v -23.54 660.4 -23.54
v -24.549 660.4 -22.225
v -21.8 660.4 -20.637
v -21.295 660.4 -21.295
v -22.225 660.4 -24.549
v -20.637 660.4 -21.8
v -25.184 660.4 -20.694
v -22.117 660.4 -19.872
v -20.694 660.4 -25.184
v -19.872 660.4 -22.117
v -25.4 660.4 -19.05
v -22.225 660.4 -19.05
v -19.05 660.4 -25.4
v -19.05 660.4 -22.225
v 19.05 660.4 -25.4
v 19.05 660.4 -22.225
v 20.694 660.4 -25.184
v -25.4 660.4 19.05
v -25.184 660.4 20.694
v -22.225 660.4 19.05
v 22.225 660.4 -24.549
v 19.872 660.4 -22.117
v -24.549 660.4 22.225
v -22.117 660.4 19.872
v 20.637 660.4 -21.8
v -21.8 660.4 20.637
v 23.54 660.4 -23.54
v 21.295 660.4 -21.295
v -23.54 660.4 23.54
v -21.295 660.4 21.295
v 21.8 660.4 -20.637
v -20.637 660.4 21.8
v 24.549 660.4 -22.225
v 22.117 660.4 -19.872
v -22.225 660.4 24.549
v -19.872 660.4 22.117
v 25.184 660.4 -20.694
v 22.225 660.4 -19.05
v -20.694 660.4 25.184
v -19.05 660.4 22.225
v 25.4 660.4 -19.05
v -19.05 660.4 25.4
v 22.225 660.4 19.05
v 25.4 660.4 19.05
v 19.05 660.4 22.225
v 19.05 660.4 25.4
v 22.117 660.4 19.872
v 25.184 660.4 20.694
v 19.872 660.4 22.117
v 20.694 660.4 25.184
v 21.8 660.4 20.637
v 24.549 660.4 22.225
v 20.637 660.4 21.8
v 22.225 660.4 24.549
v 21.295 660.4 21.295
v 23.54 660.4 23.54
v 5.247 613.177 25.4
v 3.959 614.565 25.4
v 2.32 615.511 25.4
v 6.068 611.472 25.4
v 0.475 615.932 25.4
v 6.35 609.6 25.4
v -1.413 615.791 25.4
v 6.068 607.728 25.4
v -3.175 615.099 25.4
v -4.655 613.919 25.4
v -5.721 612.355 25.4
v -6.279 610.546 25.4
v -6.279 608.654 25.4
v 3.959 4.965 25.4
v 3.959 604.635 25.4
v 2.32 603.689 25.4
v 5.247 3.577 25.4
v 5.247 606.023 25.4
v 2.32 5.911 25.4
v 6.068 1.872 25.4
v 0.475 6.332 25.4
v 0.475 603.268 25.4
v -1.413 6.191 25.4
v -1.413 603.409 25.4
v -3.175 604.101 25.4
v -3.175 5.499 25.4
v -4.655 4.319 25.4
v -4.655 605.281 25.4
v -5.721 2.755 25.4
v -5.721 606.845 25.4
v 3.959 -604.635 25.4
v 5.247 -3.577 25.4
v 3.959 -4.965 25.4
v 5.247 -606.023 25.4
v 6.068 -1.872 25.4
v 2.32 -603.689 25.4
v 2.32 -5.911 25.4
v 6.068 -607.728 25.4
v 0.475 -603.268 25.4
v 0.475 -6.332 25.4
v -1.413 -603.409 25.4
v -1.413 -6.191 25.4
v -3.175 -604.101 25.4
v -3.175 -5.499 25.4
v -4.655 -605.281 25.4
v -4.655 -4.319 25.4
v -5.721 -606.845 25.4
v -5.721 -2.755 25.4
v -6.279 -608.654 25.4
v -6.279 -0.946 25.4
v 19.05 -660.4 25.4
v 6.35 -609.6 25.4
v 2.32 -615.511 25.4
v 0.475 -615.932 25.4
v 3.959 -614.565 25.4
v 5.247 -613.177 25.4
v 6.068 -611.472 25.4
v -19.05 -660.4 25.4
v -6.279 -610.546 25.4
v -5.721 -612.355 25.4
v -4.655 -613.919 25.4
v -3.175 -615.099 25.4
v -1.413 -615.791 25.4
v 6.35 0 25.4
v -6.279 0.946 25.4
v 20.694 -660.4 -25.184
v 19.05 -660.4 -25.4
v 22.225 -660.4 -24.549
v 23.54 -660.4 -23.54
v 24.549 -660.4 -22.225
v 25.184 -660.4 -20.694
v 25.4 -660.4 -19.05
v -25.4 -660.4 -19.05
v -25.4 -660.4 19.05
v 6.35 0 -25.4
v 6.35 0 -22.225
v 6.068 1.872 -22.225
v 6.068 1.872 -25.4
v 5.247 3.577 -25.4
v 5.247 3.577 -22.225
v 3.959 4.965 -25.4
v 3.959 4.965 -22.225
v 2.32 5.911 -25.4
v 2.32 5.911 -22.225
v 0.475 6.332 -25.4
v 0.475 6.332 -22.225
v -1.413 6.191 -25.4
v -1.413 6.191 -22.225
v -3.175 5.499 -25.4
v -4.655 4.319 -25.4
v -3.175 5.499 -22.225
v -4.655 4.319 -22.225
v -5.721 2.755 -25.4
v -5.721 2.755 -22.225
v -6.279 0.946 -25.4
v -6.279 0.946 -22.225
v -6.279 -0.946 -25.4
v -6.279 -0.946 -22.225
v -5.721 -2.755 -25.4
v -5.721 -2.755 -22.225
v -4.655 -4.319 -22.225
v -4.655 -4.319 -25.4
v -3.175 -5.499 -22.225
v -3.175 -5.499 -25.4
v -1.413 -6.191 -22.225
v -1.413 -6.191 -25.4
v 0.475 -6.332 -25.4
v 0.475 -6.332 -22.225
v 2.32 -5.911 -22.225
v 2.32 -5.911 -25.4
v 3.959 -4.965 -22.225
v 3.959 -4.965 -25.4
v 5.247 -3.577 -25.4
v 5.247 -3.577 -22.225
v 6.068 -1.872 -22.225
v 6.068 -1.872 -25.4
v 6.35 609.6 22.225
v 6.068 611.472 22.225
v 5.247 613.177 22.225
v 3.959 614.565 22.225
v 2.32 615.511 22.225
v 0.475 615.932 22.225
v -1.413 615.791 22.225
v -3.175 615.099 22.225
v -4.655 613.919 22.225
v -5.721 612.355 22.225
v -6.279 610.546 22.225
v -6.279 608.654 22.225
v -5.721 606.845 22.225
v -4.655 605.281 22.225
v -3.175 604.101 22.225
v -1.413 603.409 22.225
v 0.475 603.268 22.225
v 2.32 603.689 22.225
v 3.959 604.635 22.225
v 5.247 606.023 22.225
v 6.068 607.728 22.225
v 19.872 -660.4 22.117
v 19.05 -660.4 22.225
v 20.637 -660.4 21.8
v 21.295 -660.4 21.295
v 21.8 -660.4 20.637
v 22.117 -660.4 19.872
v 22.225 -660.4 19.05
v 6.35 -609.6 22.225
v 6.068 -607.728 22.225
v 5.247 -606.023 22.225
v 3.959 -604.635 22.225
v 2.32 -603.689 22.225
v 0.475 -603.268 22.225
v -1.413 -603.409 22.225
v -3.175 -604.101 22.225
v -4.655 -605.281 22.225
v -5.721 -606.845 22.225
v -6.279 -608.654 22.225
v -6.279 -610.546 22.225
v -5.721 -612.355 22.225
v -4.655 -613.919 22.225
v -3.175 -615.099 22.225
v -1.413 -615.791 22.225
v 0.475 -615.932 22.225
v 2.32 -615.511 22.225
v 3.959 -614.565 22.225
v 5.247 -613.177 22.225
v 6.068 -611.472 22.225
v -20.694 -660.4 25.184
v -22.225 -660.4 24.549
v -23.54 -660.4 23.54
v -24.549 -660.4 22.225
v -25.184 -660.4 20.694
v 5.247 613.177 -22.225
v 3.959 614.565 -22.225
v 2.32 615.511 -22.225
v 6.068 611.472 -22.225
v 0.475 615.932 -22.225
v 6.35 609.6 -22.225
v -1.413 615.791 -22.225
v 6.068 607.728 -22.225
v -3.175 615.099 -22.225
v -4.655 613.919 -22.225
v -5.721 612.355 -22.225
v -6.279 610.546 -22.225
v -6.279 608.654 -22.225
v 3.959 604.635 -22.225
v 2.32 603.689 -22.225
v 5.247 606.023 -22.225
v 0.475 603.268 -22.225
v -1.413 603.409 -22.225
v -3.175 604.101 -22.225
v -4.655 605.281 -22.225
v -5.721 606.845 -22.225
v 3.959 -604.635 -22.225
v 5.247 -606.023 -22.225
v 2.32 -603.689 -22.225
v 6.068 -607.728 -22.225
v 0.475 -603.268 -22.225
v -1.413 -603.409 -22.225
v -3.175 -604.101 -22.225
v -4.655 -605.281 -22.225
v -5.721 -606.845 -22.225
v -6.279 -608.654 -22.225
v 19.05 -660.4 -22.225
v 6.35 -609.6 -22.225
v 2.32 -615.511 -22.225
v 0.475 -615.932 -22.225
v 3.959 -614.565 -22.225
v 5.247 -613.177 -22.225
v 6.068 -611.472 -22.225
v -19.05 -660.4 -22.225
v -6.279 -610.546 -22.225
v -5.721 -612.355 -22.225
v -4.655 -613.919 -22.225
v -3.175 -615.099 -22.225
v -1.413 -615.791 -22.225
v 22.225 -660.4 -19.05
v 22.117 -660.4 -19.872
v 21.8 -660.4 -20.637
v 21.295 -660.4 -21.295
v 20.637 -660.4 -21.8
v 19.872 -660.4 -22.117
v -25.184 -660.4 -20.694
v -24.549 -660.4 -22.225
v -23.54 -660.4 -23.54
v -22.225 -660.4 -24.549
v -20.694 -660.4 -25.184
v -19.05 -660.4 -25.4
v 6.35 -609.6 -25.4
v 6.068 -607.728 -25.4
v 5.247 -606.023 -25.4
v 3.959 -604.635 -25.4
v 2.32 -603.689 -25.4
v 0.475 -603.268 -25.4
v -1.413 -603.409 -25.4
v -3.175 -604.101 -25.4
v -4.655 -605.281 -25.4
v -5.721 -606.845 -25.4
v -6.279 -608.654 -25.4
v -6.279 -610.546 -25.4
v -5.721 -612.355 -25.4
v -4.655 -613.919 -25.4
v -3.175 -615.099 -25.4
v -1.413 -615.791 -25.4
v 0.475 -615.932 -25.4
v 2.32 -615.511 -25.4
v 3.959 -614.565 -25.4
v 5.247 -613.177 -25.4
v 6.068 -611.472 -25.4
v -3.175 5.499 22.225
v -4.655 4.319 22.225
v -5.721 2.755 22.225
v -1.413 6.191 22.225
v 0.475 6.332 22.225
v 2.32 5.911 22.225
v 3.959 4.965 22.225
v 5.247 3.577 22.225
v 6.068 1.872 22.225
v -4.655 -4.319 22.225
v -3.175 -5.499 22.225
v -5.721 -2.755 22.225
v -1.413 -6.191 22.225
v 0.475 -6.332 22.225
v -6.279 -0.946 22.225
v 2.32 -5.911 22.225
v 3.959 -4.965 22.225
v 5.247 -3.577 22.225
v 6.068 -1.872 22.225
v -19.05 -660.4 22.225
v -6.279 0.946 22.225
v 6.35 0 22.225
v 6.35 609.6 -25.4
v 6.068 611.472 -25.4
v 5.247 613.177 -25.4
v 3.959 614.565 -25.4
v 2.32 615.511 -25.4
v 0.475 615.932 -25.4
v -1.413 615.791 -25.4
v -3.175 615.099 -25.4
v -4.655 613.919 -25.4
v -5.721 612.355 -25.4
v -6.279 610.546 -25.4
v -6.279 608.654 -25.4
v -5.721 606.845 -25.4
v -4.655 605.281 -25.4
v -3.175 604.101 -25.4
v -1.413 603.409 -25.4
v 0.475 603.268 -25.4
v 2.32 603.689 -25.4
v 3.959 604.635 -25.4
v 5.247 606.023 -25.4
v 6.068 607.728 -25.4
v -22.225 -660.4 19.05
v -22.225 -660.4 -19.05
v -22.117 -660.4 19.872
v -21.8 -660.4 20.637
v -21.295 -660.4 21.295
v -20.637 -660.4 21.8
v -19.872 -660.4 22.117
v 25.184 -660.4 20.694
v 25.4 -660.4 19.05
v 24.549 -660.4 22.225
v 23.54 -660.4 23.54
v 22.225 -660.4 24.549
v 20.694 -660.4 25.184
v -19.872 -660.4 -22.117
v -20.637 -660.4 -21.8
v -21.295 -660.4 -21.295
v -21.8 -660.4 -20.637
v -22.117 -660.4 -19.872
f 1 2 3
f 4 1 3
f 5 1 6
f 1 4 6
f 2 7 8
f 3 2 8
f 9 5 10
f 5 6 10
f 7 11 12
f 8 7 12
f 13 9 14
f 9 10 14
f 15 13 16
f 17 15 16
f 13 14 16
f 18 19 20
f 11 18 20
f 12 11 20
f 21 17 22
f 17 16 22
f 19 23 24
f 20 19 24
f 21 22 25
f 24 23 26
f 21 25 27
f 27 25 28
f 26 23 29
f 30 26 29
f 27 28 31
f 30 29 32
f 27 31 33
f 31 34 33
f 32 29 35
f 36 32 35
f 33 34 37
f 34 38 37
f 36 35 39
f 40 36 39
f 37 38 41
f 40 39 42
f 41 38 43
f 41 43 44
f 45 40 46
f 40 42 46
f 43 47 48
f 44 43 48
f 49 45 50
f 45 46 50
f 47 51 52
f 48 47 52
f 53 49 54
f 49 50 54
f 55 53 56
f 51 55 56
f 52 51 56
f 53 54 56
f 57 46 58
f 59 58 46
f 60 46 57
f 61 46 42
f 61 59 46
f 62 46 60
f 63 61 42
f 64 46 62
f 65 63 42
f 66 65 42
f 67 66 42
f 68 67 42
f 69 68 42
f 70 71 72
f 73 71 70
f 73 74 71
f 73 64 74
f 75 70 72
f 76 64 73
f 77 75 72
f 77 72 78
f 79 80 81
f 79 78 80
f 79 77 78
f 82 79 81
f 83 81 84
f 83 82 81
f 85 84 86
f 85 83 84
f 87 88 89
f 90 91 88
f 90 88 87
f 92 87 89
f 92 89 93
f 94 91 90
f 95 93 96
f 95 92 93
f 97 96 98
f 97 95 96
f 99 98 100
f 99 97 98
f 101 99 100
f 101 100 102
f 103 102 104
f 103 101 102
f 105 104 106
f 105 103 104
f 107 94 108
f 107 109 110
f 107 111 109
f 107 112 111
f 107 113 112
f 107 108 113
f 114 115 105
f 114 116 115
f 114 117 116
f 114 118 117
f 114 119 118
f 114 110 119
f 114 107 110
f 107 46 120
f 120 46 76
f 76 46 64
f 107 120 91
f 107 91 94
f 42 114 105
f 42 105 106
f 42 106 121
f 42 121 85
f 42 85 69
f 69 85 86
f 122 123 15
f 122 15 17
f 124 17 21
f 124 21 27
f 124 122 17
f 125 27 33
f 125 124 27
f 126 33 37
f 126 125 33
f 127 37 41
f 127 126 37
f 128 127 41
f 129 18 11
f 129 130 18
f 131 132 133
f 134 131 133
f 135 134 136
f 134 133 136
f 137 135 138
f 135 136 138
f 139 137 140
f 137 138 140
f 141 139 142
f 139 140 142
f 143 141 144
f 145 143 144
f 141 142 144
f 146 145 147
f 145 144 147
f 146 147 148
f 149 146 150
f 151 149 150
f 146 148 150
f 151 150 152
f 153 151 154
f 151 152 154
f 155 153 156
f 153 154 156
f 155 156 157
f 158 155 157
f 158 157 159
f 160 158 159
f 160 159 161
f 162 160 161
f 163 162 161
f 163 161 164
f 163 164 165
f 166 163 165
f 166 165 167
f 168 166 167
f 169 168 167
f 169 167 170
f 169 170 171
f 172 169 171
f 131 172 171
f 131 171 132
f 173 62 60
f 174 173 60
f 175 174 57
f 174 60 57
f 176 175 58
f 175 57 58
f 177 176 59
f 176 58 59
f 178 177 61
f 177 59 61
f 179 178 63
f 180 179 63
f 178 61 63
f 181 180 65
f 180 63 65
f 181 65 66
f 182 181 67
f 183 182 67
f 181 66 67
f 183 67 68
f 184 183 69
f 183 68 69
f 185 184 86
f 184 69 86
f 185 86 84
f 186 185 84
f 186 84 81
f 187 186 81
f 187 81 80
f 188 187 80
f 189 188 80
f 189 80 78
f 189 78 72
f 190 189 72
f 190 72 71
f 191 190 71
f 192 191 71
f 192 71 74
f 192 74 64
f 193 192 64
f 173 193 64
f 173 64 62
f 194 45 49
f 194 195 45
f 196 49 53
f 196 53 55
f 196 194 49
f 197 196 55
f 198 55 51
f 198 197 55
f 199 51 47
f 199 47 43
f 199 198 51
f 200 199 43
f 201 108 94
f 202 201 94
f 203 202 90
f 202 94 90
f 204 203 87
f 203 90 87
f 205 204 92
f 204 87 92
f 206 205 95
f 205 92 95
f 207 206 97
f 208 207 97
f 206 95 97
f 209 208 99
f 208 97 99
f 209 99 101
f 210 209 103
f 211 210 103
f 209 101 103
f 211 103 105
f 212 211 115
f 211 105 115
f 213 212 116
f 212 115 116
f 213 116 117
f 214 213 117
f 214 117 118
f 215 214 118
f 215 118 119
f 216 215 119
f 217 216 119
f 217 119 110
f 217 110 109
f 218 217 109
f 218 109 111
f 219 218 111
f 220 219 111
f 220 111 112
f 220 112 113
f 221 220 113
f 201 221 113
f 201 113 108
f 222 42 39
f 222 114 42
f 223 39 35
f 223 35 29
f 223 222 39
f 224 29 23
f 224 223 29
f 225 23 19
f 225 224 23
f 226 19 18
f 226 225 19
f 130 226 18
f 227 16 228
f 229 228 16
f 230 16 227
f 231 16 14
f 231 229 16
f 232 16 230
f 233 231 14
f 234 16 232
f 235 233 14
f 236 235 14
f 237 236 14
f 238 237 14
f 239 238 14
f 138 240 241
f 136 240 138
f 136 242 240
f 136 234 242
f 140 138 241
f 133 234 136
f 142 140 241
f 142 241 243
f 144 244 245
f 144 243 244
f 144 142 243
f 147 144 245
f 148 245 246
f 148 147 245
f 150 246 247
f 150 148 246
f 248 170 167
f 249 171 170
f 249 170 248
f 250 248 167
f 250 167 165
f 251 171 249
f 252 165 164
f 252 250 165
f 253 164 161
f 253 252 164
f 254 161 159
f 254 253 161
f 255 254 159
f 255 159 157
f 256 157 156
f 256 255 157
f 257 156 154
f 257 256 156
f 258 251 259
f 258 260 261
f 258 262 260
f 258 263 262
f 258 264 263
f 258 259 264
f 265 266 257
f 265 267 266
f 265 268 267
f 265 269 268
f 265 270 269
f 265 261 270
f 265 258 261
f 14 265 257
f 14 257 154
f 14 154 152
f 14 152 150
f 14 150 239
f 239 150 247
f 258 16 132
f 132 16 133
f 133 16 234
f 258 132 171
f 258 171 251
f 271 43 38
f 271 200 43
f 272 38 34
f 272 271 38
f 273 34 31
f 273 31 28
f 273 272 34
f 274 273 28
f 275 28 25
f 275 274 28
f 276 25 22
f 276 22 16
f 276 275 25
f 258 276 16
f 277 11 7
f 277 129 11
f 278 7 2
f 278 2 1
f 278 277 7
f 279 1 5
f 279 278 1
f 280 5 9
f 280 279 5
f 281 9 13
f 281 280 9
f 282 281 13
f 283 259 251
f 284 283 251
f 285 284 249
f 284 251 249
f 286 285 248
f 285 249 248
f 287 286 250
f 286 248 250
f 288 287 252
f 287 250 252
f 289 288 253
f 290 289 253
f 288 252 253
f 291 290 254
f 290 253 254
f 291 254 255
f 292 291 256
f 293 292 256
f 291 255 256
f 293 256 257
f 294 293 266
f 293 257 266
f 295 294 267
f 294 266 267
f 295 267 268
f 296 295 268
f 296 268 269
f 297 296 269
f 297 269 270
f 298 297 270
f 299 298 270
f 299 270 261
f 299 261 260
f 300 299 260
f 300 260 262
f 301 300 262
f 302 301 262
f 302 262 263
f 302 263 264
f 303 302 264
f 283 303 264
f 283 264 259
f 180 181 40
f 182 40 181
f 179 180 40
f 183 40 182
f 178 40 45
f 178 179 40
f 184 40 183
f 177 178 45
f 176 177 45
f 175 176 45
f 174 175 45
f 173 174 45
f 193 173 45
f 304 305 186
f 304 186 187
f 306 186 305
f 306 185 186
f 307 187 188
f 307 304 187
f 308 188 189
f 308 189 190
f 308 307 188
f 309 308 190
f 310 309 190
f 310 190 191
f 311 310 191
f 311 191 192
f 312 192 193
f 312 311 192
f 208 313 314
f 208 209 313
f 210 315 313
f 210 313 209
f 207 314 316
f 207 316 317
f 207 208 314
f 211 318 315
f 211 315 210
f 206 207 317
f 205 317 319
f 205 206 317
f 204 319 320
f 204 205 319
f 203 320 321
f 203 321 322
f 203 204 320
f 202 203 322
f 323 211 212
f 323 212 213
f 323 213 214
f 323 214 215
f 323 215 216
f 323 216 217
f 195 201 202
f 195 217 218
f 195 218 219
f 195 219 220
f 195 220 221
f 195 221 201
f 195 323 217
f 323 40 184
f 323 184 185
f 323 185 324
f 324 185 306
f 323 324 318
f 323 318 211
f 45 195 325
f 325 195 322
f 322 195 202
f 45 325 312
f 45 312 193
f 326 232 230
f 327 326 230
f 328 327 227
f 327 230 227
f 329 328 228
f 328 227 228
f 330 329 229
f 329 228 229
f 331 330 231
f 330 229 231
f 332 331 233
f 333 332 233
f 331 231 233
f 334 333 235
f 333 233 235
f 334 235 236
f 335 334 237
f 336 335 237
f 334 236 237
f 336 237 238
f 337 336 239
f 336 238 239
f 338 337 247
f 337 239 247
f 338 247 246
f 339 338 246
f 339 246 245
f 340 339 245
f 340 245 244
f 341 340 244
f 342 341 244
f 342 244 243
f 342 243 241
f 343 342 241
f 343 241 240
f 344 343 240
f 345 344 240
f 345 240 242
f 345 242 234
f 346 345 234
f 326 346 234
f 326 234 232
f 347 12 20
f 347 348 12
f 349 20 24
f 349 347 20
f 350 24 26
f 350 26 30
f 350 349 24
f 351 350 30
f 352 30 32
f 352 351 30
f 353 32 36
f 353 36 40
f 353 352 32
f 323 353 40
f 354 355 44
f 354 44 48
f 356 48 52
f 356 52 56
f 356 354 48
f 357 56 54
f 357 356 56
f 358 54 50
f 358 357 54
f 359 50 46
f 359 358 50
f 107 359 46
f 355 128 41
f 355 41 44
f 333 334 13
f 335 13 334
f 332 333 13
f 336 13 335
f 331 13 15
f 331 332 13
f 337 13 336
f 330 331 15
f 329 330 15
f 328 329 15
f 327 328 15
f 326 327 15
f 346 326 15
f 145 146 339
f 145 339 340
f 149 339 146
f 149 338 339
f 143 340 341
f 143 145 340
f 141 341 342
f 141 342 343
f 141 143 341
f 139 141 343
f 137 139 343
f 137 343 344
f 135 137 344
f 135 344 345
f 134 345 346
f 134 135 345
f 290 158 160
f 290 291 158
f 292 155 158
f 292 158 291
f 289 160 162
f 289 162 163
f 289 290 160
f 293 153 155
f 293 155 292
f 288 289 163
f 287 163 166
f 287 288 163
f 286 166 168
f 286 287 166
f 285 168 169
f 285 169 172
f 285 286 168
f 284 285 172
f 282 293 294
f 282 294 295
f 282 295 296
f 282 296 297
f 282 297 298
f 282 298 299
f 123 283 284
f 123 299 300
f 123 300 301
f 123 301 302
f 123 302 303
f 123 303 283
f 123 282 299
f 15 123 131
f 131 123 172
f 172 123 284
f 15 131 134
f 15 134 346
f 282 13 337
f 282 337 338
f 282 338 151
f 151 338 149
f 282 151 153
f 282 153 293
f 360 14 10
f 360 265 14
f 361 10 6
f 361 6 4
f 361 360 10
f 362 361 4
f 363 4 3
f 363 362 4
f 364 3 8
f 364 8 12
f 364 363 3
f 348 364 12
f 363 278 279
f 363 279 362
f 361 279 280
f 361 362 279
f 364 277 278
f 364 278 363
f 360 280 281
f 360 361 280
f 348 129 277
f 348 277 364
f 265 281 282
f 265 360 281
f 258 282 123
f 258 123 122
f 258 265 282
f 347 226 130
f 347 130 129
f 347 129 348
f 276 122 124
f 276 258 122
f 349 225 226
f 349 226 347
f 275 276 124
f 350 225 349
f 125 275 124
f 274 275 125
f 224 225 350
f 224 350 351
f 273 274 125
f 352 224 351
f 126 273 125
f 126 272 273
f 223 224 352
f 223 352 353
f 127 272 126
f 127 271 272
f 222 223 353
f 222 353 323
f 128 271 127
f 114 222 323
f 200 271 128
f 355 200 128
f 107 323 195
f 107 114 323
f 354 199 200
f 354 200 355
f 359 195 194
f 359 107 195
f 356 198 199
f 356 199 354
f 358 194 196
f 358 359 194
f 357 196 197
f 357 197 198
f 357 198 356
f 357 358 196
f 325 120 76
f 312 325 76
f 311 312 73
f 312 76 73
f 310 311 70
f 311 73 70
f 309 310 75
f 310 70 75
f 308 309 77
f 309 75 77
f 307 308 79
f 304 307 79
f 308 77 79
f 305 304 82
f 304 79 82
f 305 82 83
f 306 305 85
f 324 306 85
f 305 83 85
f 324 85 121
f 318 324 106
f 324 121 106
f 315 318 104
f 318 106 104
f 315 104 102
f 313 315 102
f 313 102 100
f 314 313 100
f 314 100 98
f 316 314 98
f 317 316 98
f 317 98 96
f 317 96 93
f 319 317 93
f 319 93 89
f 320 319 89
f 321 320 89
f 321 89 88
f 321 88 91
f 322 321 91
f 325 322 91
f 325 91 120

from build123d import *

# Parameters (mm, degrees)
F1_DEPTH = 660.4
F2_R     = 6.35
F3_DEPTH = 50.801


with BuildPart() as f1:
    # F0 (on Front) → F1 (new body, symmetric)
    with BuildSketch(Plane.XZ):
        with BuildLine():
            Line((-19.05, -25.4), (19.05, -25.4))
            ThreePointArc((19.05, -25.4), (23.540128, -23.540128), (25.4, -19.05))
            Line((25.4, -19.05), (25.4, 19.05))
            ThreePointArc((25.4, 19.05), (23.540128, 23.540128), (19.05, 25.4))
            Line((19.05, 25.4), (-19.05, 25.4))
            ThreePointArc((-19.05, 25.4), (-23.540128, 23.540128), (-25.4, 19.05))
            Line((-25.4, 19.05), (-25.4, -19.05))
            ThreePointArc((-25.4, -19.05), (-23.540128, -23.540128), (-19.05, -25.4))
        make_face()
        with BuildLine():
            Line((-19.05, 22.225), (19.05, 22.225))
            ThreePointArc((19.05, 22.225), (21.295064, 21.295064), (22.225, 19.05))
            Line((22.225, 19.05), (22.225, -19.05))
            ThreePointArc((22.225, -19.05), (21.295064, -21.295064), (19.05, -22.225))
            Line((19.05, -22.225), (-19.05, -22.225))
            ThreePointArc((-19.05, -22.225), (-21.295064, -21.295064), (-22.225, -19.05))
            Line((-22.225, -19.05), (-22.225, 19.05))
            ThreePointArc((-22.225, 19.05), (-21.295064, 21.295064), (-19.05, 22.225))
        make_face(mode=Mode.SUBTRACT)
    extrude(amount=F1_DEPTH, both=True)

    # F2 (on face) → F3 (cut, through all)
    with BuildSketch(Plane.XY.offset(25.4)):
        Circle(F2_R)
        with Locations((0, -609.6)):
            Circle(F2_R)
        with Locations((0, 609.6)):
            Circle(F2_R)
    extrude(amount=-F3_DEPTH, mode=Mode.SUBTRACT)


solid = f1.part
